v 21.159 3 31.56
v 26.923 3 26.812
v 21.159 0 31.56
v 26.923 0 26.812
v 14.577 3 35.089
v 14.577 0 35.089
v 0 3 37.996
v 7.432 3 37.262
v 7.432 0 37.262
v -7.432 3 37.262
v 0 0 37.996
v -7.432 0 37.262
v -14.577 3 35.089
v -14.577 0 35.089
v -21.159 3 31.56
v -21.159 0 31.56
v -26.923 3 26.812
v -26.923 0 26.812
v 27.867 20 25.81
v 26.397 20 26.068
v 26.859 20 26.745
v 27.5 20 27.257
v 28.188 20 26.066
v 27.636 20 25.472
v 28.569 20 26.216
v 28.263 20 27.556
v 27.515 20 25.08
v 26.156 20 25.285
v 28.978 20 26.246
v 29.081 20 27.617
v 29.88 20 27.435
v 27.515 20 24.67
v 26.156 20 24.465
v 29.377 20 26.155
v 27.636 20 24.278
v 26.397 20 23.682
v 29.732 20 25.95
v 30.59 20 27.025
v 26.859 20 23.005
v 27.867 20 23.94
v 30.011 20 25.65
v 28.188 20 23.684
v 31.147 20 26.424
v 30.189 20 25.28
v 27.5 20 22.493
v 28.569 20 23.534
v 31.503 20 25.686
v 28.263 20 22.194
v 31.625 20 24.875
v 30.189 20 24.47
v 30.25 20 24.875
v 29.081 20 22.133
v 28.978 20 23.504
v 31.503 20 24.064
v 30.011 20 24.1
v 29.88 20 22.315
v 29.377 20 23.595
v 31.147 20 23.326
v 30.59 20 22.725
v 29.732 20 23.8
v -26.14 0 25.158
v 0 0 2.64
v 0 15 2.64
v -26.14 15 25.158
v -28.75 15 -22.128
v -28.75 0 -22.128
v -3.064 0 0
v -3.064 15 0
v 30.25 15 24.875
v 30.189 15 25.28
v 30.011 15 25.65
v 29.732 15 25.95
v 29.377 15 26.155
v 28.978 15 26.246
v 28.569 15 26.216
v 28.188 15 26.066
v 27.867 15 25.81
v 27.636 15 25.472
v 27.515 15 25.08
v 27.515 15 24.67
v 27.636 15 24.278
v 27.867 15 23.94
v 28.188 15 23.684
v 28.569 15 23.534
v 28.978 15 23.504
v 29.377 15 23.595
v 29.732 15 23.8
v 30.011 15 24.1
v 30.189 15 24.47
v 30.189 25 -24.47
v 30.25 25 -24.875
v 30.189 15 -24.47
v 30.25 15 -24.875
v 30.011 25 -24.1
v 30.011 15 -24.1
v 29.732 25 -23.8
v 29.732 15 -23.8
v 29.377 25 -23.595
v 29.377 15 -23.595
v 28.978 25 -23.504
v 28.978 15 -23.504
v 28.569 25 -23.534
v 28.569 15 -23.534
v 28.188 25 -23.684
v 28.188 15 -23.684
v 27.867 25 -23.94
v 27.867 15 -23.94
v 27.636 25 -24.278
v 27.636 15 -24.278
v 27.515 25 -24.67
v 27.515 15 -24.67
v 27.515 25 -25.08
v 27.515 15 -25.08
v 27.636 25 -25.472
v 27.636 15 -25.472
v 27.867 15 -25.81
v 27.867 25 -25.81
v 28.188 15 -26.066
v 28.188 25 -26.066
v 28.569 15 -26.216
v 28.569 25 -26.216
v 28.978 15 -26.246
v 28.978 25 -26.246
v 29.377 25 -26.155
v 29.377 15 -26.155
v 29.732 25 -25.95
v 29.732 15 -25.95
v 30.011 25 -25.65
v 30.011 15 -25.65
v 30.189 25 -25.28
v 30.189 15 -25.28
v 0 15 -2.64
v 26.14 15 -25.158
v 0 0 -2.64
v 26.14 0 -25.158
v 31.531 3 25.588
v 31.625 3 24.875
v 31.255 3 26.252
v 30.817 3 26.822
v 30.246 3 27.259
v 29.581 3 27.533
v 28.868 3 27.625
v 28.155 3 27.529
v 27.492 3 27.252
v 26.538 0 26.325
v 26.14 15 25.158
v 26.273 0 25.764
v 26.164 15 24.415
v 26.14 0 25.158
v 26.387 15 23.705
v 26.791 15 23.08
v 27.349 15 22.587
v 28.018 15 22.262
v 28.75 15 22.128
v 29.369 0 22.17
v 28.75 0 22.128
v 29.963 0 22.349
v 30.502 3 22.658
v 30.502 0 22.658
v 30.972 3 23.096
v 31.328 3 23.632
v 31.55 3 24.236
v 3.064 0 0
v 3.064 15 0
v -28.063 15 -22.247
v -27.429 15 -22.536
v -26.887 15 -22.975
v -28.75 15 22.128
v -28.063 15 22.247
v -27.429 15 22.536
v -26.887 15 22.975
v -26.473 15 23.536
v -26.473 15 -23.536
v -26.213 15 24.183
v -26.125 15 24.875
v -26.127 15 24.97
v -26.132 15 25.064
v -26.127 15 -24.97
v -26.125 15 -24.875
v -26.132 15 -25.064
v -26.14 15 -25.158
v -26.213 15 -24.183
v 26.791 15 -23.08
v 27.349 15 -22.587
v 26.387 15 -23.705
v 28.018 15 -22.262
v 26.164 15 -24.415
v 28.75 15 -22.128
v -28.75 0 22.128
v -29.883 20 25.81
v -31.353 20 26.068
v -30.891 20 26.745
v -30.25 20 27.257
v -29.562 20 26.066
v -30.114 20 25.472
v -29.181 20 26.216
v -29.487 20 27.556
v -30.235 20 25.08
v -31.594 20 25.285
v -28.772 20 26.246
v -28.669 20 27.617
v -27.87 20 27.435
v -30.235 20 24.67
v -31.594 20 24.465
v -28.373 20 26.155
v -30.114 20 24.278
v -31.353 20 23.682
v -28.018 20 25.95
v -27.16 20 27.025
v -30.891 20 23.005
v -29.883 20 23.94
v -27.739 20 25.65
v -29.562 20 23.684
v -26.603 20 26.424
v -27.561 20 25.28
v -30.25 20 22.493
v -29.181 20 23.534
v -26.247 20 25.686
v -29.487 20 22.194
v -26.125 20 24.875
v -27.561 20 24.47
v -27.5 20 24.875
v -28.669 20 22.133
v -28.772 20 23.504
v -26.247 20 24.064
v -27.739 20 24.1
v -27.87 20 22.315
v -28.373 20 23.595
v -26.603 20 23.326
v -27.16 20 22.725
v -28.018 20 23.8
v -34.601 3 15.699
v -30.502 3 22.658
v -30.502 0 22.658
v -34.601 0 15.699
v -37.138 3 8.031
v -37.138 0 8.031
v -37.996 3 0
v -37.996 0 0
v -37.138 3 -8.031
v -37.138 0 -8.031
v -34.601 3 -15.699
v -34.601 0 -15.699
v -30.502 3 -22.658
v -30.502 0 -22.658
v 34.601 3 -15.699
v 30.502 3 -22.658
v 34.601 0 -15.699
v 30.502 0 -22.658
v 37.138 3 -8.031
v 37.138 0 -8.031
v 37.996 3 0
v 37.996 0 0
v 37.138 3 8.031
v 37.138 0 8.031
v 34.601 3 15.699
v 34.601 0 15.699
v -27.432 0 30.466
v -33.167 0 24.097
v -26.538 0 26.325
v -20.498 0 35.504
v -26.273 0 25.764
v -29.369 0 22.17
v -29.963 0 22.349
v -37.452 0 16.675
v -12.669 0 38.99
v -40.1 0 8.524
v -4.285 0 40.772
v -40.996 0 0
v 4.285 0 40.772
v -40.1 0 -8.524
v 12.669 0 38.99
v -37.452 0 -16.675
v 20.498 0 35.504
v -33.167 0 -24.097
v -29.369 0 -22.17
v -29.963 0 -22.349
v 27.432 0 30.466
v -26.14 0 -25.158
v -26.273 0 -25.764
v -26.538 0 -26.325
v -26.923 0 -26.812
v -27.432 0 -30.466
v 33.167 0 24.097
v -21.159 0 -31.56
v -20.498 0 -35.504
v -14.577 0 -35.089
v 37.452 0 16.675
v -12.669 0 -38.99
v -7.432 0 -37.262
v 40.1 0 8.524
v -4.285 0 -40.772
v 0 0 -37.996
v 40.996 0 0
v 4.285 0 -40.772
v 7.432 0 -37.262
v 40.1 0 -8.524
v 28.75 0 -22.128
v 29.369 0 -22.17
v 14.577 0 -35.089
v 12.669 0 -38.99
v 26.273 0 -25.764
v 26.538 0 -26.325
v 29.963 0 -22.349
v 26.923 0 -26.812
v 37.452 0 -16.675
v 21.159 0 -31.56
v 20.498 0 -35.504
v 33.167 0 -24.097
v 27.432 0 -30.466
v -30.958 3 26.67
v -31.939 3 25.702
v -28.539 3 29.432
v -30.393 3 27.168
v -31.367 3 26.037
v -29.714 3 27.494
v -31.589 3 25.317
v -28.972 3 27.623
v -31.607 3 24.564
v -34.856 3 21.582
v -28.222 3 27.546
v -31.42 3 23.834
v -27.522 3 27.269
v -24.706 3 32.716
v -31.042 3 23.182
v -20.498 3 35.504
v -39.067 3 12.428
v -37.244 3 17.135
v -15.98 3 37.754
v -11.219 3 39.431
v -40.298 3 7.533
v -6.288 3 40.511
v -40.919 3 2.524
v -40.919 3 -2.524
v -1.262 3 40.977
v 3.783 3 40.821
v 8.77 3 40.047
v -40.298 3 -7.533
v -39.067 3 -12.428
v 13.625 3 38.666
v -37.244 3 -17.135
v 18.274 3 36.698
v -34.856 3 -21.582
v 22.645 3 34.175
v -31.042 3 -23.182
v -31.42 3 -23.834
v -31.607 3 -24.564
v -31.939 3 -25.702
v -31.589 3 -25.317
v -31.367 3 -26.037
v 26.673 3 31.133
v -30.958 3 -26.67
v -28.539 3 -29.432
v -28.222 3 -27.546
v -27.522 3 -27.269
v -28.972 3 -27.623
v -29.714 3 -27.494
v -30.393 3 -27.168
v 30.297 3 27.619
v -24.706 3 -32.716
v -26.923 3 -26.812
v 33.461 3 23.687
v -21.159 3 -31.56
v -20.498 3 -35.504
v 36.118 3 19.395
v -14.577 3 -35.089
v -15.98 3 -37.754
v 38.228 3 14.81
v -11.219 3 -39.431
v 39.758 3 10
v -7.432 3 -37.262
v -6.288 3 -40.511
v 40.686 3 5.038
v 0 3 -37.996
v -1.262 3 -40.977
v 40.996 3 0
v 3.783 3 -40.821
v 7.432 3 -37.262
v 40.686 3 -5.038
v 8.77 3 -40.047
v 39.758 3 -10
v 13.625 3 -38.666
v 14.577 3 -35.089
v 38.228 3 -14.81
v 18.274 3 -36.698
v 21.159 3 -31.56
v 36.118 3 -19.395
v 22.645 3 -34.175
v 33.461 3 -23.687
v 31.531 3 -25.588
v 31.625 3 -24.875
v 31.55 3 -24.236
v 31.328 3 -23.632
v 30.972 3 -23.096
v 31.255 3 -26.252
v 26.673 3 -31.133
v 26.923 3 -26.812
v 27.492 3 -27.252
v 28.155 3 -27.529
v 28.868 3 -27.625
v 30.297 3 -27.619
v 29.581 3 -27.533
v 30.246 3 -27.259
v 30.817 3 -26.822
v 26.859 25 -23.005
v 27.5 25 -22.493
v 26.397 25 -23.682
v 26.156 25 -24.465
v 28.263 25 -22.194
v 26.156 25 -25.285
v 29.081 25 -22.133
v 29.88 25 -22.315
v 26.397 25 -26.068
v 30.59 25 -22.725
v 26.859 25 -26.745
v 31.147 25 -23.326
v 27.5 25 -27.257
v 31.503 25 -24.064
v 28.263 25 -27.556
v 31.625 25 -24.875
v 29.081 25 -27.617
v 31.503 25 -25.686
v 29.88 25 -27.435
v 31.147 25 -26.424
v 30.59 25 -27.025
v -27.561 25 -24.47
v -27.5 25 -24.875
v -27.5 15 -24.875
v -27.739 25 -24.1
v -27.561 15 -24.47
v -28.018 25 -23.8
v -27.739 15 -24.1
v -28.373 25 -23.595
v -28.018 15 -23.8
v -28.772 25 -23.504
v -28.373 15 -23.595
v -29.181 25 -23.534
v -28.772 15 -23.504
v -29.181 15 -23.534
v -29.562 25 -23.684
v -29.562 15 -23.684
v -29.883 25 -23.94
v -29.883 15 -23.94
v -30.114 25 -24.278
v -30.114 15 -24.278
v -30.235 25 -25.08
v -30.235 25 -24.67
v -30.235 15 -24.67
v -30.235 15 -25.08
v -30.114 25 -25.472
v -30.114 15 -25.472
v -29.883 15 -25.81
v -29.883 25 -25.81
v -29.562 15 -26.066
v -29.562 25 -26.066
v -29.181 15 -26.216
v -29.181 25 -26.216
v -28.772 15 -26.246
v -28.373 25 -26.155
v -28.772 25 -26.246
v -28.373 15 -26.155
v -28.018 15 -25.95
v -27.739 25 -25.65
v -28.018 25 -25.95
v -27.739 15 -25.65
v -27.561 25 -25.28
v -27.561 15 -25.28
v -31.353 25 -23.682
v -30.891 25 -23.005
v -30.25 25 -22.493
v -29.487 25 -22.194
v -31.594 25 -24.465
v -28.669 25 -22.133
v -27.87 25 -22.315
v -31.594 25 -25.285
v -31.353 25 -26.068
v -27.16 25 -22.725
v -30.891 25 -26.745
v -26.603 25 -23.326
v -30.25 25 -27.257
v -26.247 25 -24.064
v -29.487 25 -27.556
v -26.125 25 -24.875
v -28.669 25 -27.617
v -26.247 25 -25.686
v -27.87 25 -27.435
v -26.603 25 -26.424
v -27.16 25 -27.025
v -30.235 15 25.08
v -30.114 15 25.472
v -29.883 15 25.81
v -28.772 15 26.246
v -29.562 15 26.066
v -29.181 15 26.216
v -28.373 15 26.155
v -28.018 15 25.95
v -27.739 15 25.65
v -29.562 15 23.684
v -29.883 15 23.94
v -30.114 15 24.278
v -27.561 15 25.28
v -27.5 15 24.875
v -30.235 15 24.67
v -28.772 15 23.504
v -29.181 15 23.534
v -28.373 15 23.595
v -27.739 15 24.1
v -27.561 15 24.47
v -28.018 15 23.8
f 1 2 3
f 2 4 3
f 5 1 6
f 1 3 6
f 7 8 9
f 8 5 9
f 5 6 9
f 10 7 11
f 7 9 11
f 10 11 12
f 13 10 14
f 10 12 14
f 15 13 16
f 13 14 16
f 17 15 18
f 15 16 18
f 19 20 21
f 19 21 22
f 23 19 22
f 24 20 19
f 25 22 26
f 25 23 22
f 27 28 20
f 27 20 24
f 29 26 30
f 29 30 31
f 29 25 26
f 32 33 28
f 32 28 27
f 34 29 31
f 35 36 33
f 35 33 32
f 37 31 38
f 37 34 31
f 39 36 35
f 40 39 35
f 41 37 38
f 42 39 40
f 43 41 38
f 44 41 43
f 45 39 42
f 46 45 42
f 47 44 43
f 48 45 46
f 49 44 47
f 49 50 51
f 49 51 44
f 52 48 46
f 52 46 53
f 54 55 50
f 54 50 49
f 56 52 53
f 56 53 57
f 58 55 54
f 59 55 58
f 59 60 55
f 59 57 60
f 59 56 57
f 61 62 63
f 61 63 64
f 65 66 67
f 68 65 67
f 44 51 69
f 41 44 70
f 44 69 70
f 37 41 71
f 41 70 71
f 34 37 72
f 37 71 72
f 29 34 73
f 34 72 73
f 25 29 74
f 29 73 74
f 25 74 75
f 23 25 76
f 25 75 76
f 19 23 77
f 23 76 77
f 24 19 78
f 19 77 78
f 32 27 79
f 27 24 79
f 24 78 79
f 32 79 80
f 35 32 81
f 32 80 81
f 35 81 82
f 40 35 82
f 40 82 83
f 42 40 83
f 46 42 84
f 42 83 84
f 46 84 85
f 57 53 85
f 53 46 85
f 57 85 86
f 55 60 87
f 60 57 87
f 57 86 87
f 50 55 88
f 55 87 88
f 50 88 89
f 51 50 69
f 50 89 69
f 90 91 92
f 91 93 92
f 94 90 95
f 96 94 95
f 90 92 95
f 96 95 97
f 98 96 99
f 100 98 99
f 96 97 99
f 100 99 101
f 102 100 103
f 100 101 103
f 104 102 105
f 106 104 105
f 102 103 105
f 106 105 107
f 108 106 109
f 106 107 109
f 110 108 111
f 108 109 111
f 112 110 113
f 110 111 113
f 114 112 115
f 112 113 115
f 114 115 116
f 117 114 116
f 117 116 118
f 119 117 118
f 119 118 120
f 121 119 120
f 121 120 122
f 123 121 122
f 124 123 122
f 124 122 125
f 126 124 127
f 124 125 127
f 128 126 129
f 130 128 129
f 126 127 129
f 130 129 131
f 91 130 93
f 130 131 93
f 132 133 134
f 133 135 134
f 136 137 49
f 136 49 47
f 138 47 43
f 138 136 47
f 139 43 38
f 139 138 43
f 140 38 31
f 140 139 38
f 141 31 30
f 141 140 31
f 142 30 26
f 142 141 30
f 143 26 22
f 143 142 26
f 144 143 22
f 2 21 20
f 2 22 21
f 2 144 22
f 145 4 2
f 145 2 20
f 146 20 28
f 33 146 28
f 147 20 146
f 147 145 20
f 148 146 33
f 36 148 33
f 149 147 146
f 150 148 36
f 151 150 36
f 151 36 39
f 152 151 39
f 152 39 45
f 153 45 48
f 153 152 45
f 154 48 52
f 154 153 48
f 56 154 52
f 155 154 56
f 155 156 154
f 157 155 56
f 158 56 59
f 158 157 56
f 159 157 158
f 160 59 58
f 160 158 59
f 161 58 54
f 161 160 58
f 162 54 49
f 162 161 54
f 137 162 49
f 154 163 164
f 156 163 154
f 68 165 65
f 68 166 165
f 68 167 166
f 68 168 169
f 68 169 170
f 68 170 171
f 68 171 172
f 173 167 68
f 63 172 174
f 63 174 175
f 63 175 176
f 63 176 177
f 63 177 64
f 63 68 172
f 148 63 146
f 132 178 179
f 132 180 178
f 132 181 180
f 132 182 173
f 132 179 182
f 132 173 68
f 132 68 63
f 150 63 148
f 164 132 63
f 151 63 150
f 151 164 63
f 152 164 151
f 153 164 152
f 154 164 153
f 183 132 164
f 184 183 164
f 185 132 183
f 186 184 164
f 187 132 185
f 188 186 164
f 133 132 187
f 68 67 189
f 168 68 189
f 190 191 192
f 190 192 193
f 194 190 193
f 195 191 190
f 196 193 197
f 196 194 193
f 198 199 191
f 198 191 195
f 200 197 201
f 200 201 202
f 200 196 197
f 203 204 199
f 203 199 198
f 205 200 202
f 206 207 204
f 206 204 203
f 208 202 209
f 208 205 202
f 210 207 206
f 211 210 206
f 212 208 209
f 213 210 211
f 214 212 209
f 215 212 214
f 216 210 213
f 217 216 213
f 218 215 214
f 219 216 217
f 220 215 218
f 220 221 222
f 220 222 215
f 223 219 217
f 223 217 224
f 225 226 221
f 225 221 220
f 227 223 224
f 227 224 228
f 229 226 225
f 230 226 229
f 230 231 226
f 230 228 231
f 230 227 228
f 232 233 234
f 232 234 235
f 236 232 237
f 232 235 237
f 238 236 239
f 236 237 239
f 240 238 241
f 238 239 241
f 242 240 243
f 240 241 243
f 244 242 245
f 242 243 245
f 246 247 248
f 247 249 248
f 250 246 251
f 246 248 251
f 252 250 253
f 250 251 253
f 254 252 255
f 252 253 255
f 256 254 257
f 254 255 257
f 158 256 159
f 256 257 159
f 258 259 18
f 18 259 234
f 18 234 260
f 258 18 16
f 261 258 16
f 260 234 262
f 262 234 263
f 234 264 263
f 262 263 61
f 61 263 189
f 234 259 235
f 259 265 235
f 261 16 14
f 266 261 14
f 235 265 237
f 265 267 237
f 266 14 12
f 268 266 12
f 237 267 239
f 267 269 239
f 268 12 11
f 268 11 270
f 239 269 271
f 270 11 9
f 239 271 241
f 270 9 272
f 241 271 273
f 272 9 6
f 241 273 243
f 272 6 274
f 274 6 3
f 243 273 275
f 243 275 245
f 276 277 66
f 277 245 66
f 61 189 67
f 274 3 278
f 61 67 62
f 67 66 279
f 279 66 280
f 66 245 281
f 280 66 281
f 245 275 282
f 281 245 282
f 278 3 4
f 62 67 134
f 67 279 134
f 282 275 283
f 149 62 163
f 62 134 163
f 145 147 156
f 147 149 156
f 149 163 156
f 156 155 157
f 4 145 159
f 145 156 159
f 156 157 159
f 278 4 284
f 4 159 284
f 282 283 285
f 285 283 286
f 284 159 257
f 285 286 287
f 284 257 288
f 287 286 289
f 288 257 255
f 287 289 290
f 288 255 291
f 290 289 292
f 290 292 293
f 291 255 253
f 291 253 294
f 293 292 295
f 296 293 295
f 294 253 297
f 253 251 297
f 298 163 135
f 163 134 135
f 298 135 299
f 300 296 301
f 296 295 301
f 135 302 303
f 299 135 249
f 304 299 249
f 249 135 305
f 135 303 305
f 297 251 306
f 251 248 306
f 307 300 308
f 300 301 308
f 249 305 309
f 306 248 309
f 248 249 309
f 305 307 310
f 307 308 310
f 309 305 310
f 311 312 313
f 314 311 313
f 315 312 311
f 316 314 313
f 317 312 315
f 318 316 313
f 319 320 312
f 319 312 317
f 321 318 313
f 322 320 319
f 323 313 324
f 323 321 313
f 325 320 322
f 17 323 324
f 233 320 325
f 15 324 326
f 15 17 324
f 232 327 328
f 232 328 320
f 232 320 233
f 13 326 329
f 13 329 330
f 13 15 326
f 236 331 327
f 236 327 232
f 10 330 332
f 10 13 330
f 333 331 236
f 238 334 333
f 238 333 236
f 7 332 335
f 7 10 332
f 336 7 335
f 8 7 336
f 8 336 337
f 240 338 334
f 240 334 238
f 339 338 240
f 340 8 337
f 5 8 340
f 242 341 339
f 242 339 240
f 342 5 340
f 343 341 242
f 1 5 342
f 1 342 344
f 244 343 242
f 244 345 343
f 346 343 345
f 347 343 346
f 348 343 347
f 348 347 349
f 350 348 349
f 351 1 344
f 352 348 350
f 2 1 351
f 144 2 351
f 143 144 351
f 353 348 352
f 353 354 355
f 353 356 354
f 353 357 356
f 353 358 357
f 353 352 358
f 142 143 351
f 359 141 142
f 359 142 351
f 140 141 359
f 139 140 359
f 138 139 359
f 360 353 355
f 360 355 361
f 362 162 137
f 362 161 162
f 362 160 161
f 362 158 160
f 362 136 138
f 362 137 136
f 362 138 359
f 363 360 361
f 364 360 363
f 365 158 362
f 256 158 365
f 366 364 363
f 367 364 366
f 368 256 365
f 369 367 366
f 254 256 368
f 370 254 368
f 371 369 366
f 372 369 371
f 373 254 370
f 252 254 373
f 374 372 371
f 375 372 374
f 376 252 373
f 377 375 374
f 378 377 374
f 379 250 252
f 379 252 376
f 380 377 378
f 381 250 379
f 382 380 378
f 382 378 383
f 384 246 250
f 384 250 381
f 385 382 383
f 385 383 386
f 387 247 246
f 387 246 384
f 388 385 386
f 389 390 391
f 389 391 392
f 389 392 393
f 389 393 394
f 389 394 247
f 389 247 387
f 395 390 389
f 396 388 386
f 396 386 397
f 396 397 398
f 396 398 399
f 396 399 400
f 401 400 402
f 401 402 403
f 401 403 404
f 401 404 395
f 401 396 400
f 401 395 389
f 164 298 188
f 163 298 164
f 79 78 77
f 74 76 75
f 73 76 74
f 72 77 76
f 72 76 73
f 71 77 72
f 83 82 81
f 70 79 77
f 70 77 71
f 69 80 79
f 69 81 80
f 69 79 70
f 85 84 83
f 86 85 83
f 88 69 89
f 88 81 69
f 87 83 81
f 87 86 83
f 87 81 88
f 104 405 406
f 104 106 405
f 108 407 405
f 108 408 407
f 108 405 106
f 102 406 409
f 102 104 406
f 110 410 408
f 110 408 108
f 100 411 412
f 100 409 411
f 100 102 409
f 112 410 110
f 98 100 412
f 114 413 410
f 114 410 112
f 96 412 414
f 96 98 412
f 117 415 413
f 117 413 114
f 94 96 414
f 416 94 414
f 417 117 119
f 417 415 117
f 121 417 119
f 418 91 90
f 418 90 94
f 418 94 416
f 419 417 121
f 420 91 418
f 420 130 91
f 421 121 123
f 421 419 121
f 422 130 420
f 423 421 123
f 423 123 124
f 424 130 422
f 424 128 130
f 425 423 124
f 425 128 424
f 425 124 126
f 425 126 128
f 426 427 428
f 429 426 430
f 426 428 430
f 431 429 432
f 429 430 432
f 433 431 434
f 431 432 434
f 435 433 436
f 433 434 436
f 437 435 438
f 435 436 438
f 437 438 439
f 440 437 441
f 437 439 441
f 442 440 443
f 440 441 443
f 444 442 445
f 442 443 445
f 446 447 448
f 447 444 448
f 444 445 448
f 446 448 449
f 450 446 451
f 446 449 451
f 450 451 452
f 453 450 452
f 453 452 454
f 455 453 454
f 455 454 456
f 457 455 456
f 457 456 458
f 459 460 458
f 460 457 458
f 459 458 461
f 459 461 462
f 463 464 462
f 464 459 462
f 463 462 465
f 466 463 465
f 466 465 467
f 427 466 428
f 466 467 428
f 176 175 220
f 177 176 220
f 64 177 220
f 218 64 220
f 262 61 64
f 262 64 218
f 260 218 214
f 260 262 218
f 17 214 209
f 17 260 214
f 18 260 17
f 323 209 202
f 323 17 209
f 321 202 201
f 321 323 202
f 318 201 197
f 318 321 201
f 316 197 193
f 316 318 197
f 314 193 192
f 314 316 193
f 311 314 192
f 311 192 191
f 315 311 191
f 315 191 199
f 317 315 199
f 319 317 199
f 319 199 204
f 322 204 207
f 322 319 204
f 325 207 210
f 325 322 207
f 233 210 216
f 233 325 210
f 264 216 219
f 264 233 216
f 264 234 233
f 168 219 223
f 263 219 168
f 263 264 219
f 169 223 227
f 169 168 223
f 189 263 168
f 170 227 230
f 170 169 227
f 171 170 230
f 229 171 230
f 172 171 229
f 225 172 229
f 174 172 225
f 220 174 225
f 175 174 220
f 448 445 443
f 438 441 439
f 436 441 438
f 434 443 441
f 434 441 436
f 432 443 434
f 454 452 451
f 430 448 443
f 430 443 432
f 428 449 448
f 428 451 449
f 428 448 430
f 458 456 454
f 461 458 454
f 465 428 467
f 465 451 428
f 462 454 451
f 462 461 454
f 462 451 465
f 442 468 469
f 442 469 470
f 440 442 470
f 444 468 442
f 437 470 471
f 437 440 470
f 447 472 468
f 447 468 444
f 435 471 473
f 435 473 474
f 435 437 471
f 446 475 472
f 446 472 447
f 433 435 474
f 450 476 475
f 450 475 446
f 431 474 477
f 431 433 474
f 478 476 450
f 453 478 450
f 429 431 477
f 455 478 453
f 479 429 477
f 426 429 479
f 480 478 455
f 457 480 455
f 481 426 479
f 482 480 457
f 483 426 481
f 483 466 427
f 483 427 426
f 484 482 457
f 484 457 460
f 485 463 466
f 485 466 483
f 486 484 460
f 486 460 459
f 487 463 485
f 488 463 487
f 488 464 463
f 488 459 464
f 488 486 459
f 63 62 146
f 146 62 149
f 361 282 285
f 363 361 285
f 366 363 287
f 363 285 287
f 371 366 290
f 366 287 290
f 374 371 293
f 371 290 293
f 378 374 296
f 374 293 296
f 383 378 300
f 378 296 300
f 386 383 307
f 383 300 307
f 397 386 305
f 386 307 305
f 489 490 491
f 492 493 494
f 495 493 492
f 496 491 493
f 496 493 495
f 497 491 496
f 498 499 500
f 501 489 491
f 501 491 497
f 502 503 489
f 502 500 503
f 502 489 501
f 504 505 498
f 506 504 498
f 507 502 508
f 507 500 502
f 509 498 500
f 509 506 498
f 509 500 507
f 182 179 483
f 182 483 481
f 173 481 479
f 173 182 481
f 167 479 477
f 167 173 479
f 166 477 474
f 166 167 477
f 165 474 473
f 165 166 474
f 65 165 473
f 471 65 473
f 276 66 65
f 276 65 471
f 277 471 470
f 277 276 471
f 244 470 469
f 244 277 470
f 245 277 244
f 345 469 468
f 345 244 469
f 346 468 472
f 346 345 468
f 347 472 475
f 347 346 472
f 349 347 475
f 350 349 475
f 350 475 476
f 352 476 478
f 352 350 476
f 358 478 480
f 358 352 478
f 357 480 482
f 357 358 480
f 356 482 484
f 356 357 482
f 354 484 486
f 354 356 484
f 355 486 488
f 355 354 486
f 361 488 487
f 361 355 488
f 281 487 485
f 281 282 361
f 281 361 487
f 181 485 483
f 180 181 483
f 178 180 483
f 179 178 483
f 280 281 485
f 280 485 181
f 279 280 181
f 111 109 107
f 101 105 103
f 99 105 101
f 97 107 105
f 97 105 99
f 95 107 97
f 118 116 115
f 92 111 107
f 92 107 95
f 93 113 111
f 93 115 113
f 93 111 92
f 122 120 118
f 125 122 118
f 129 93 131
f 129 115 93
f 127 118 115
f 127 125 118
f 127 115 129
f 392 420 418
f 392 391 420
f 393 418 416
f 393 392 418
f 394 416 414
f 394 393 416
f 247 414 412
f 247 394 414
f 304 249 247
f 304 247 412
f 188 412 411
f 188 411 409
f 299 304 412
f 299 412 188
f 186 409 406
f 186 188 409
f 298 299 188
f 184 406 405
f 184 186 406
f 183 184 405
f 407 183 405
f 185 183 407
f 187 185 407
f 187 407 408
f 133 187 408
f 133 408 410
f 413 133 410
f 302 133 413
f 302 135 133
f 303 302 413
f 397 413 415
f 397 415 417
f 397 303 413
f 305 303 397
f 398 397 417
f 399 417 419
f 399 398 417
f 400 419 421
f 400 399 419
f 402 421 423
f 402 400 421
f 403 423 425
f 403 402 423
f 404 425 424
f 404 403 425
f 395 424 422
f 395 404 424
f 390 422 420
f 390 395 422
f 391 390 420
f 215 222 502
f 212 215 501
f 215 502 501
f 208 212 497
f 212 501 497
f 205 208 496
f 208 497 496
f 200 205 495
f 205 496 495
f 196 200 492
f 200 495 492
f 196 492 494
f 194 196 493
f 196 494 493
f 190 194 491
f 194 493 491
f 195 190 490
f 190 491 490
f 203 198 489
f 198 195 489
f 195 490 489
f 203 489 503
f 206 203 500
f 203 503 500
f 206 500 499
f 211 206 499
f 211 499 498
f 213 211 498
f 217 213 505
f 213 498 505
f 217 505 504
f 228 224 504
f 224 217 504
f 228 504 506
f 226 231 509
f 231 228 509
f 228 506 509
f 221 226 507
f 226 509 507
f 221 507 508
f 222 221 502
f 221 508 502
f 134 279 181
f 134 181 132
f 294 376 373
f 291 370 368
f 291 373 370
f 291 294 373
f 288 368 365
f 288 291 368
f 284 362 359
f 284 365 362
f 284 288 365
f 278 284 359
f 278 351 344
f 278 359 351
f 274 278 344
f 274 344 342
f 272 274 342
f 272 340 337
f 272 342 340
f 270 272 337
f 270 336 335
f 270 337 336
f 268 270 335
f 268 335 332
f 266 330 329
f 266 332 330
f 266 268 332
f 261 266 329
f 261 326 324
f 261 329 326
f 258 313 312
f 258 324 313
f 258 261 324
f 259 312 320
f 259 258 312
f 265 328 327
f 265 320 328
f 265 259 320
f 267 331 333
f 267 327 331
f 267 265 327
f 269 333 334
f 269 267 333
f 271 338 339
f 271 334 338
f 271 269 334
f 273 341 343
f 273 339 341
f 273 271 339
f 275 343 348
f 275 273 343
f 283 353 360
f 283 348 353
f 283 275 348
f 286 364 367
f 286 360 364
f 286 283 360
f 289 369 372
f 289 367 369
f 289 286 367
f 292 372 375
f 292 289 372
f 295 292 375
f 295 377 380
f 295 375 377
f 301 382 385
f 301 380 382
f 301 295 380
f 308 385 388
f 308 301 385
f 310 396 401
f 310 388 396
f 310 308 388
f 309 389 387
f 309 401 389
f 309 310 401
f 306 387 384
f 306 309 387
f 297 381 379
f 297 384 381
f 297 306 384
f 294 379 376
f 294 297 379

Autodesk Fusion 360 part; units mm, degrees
sketch "Sketch1" plane through (0, 0, 0) normal (0, 1, 0) x (1, 0, 0)
  circle A0 centre (0, 0) radius 44
  line L0 (28.875, 24.875) -> (-28.875, 24.875) construction
  line L1 (-28.875, 24.875) -> (-28.875, -24.875) construction
  line L2 (-28.875, -24.875) -> (28.875, -24.875) construction
  line L3 (28.875, -24.875) -> (28.875, 24.875) construction
  line L4 (28.875, 24.875) -> (-28.875, -24.875) construction
  line L5 (-28.875, 24.875) -> (28.875, -24.875) construction
  circle A1 centre (-28.875, 24.875) radius 1.375
  circle A2 centre (-28.875, 24.875) radius 2.75
  circle A3 centre (-28.875, -24.875) radius 1.375
  circle A4 centre (-28.875, -24.875) radius 2.75
  circle A5 centre (28.875, 24.875) radius 1.375
  circle A6 centre (28.875, 24.875) radius 2.75
  circle A7 centre (28.875, -24.875) radius 1.375
  circle A8 centre (28.875, -24.875) radius 2.75
  line L6 (-30.4443, 23.5871) -> (27.8036, -26.5919)
  line L7 (-27.8037, 26.5919) -> (30.4442, -23.5871)
  line L8 (27.8041, 26.5923) -> (-30.4447, -23.5875)
  line L9 (30.4447, 23.5875) -> (-27.8041, -26.5923)
  circle A9 centre (0, 0) radius 40.9963
  circle A10 centre (0, 0) radius 37.9963
  dimension "d1" = 88
  dimension "d2" = 57.75
  dimension "d3" = 49.75
  dimension "d4" = 2.75
  dimension "d5" = 5.5
  dimension "d6" = 2.75
  dimension "d7" = 5.5
  dimension "d8" = 2.75
  dimension "d9" = 5.5
  dimension "d10" = 2.75
  dimension "d11" = 5.5
  dimension "d26" = 2
  dimension "d27" = -2
  dimension "d28" = 2
  dimension "d29" = -2
  dimension "d30" = -3
extrude "Extrude1" add sketch "Sketch1" along normal blind 3 contours A0 | A1 A10 | A1 A2 L6 L7 A10 | A1 A10 | A1 A2 A10 | A2 L7 A10 | A2 L6 A10 | A2 L6 L7 L8 | A2 A6 L7 L8 A10 | A2 A4 L6 L8 A10 | A6 L7 L8 L9 | L6 L7 L8 L9 | A6 L8 A10 | A5 A6 A10 | A4 L6 L8 L9 | A3 A4 A10 | A4 L8 A10 | A6 A8 L7 L9 A10 | A8 L6 L7 L9 | A5 A6 L8 L9 A10 | A4 A8 L6 L9 A10 | A3 A4 L8 L9 A10 | A4 L9 A10 | A7 A8 L6 L7 A10 | A8 L7 A10 | A6 L9 A10 | A5 A10 | A5 A10 | A8 L6 A10 | A7 A8 A10 | A3 A10 | A3 A10 | A7 A10 | A7 A10 | A9 makes body 1
extrude "Extrude2" add sketch "Sketch1" along normal blind 20 contours A3 A4 A10 | A4 L8 A10 | A3 A4 L8 L9 A10 | A4 L9 A10 | A7 A8 L6 L7 A10 | A8 L7 A10 | A8 L6 A10 | A7 A8 A10 bodies 1
extrude "Extrude3" add sketch "Sketch1" along normal blind 25 contours A1 A2 L6 L7 A10 | A1 A2 A10 | A2 L7 A10 | A2 L6 A10 | A6 L8 A10 | A5 A6 A10 | A5 A6 L8 L9 A10 | A6 L9 A10 bodies 1
extrude "Extrude4" add sketch "Sketch1" along normal blind 15 contours A1 A10 | A1 A10 | A5 A10 | A5 A10 | A3 A10 | A3 A10 | A7 A10 | A7 A10 bodies 1
extrude "Extrude5" add sketch "Sketch1" along normal blind 15 contours A2 L6 L7 L8 | A6 L7 L8 L9 | L6 L7 L8 L9 | A4 L6 L8 L9 | A8 L6 L7 L9 bodies 1
extrude "Extrude7" add sketch "Sketch1" along normal blind 3 separate body contours A9 makes body 2
extrude "Extrude8" add sketch "Sketch1" along normal blind 15 separate body contours A1 A10 | A1 A10 | A2 L6 L7 L8 | A6 L7 L8 L9 | L6 L7 L8 L9 | A4 L6 L8 L9 | A8 L6 L7 L9 | A5 A10 | A5 A10 | A3 A10 | A3 A10 | A7 A10 | A7 A10 makes body 3 at (-27.5068, 10, -25.0119) makes body 4 at (30.2432, 5, -24.7381) makes body 5 at (-29.6776, 10, 25.9914) makes body 6 at (9.9096, 0, 8.6263) makes body 7 at (30.2432, 5, 25.0119)
extrude "Extrude9" add sketch "Sketch1" along normal blind 20 contours A3 A4 A10 | A4 L8 A10 | A3 A4 L8 L9 A10 | A4 L9 A10 | A7 A8 L6 L7 A10 | A8 L7 A10 | A8 L6 A10 | A7 A8 A10 bodies 2 5 6 7
extrude "Extrude10" add sketch "Sketch1" along normal blind 25 contours A1 A2 L6 L7 A10 | A1 A2 A10 | A2 L7 A10 | A2 L6 A10 | A6 L8 A10 | A5 A6 A10 | A5 A6 L8 L9 A10 | A6 L9 A10 bodies 2 3 4
hidden bodies 1
equation "d2 = 55 mm + 2.75 mm"
equation "d3 = 48 mm + 1.75 mm"
